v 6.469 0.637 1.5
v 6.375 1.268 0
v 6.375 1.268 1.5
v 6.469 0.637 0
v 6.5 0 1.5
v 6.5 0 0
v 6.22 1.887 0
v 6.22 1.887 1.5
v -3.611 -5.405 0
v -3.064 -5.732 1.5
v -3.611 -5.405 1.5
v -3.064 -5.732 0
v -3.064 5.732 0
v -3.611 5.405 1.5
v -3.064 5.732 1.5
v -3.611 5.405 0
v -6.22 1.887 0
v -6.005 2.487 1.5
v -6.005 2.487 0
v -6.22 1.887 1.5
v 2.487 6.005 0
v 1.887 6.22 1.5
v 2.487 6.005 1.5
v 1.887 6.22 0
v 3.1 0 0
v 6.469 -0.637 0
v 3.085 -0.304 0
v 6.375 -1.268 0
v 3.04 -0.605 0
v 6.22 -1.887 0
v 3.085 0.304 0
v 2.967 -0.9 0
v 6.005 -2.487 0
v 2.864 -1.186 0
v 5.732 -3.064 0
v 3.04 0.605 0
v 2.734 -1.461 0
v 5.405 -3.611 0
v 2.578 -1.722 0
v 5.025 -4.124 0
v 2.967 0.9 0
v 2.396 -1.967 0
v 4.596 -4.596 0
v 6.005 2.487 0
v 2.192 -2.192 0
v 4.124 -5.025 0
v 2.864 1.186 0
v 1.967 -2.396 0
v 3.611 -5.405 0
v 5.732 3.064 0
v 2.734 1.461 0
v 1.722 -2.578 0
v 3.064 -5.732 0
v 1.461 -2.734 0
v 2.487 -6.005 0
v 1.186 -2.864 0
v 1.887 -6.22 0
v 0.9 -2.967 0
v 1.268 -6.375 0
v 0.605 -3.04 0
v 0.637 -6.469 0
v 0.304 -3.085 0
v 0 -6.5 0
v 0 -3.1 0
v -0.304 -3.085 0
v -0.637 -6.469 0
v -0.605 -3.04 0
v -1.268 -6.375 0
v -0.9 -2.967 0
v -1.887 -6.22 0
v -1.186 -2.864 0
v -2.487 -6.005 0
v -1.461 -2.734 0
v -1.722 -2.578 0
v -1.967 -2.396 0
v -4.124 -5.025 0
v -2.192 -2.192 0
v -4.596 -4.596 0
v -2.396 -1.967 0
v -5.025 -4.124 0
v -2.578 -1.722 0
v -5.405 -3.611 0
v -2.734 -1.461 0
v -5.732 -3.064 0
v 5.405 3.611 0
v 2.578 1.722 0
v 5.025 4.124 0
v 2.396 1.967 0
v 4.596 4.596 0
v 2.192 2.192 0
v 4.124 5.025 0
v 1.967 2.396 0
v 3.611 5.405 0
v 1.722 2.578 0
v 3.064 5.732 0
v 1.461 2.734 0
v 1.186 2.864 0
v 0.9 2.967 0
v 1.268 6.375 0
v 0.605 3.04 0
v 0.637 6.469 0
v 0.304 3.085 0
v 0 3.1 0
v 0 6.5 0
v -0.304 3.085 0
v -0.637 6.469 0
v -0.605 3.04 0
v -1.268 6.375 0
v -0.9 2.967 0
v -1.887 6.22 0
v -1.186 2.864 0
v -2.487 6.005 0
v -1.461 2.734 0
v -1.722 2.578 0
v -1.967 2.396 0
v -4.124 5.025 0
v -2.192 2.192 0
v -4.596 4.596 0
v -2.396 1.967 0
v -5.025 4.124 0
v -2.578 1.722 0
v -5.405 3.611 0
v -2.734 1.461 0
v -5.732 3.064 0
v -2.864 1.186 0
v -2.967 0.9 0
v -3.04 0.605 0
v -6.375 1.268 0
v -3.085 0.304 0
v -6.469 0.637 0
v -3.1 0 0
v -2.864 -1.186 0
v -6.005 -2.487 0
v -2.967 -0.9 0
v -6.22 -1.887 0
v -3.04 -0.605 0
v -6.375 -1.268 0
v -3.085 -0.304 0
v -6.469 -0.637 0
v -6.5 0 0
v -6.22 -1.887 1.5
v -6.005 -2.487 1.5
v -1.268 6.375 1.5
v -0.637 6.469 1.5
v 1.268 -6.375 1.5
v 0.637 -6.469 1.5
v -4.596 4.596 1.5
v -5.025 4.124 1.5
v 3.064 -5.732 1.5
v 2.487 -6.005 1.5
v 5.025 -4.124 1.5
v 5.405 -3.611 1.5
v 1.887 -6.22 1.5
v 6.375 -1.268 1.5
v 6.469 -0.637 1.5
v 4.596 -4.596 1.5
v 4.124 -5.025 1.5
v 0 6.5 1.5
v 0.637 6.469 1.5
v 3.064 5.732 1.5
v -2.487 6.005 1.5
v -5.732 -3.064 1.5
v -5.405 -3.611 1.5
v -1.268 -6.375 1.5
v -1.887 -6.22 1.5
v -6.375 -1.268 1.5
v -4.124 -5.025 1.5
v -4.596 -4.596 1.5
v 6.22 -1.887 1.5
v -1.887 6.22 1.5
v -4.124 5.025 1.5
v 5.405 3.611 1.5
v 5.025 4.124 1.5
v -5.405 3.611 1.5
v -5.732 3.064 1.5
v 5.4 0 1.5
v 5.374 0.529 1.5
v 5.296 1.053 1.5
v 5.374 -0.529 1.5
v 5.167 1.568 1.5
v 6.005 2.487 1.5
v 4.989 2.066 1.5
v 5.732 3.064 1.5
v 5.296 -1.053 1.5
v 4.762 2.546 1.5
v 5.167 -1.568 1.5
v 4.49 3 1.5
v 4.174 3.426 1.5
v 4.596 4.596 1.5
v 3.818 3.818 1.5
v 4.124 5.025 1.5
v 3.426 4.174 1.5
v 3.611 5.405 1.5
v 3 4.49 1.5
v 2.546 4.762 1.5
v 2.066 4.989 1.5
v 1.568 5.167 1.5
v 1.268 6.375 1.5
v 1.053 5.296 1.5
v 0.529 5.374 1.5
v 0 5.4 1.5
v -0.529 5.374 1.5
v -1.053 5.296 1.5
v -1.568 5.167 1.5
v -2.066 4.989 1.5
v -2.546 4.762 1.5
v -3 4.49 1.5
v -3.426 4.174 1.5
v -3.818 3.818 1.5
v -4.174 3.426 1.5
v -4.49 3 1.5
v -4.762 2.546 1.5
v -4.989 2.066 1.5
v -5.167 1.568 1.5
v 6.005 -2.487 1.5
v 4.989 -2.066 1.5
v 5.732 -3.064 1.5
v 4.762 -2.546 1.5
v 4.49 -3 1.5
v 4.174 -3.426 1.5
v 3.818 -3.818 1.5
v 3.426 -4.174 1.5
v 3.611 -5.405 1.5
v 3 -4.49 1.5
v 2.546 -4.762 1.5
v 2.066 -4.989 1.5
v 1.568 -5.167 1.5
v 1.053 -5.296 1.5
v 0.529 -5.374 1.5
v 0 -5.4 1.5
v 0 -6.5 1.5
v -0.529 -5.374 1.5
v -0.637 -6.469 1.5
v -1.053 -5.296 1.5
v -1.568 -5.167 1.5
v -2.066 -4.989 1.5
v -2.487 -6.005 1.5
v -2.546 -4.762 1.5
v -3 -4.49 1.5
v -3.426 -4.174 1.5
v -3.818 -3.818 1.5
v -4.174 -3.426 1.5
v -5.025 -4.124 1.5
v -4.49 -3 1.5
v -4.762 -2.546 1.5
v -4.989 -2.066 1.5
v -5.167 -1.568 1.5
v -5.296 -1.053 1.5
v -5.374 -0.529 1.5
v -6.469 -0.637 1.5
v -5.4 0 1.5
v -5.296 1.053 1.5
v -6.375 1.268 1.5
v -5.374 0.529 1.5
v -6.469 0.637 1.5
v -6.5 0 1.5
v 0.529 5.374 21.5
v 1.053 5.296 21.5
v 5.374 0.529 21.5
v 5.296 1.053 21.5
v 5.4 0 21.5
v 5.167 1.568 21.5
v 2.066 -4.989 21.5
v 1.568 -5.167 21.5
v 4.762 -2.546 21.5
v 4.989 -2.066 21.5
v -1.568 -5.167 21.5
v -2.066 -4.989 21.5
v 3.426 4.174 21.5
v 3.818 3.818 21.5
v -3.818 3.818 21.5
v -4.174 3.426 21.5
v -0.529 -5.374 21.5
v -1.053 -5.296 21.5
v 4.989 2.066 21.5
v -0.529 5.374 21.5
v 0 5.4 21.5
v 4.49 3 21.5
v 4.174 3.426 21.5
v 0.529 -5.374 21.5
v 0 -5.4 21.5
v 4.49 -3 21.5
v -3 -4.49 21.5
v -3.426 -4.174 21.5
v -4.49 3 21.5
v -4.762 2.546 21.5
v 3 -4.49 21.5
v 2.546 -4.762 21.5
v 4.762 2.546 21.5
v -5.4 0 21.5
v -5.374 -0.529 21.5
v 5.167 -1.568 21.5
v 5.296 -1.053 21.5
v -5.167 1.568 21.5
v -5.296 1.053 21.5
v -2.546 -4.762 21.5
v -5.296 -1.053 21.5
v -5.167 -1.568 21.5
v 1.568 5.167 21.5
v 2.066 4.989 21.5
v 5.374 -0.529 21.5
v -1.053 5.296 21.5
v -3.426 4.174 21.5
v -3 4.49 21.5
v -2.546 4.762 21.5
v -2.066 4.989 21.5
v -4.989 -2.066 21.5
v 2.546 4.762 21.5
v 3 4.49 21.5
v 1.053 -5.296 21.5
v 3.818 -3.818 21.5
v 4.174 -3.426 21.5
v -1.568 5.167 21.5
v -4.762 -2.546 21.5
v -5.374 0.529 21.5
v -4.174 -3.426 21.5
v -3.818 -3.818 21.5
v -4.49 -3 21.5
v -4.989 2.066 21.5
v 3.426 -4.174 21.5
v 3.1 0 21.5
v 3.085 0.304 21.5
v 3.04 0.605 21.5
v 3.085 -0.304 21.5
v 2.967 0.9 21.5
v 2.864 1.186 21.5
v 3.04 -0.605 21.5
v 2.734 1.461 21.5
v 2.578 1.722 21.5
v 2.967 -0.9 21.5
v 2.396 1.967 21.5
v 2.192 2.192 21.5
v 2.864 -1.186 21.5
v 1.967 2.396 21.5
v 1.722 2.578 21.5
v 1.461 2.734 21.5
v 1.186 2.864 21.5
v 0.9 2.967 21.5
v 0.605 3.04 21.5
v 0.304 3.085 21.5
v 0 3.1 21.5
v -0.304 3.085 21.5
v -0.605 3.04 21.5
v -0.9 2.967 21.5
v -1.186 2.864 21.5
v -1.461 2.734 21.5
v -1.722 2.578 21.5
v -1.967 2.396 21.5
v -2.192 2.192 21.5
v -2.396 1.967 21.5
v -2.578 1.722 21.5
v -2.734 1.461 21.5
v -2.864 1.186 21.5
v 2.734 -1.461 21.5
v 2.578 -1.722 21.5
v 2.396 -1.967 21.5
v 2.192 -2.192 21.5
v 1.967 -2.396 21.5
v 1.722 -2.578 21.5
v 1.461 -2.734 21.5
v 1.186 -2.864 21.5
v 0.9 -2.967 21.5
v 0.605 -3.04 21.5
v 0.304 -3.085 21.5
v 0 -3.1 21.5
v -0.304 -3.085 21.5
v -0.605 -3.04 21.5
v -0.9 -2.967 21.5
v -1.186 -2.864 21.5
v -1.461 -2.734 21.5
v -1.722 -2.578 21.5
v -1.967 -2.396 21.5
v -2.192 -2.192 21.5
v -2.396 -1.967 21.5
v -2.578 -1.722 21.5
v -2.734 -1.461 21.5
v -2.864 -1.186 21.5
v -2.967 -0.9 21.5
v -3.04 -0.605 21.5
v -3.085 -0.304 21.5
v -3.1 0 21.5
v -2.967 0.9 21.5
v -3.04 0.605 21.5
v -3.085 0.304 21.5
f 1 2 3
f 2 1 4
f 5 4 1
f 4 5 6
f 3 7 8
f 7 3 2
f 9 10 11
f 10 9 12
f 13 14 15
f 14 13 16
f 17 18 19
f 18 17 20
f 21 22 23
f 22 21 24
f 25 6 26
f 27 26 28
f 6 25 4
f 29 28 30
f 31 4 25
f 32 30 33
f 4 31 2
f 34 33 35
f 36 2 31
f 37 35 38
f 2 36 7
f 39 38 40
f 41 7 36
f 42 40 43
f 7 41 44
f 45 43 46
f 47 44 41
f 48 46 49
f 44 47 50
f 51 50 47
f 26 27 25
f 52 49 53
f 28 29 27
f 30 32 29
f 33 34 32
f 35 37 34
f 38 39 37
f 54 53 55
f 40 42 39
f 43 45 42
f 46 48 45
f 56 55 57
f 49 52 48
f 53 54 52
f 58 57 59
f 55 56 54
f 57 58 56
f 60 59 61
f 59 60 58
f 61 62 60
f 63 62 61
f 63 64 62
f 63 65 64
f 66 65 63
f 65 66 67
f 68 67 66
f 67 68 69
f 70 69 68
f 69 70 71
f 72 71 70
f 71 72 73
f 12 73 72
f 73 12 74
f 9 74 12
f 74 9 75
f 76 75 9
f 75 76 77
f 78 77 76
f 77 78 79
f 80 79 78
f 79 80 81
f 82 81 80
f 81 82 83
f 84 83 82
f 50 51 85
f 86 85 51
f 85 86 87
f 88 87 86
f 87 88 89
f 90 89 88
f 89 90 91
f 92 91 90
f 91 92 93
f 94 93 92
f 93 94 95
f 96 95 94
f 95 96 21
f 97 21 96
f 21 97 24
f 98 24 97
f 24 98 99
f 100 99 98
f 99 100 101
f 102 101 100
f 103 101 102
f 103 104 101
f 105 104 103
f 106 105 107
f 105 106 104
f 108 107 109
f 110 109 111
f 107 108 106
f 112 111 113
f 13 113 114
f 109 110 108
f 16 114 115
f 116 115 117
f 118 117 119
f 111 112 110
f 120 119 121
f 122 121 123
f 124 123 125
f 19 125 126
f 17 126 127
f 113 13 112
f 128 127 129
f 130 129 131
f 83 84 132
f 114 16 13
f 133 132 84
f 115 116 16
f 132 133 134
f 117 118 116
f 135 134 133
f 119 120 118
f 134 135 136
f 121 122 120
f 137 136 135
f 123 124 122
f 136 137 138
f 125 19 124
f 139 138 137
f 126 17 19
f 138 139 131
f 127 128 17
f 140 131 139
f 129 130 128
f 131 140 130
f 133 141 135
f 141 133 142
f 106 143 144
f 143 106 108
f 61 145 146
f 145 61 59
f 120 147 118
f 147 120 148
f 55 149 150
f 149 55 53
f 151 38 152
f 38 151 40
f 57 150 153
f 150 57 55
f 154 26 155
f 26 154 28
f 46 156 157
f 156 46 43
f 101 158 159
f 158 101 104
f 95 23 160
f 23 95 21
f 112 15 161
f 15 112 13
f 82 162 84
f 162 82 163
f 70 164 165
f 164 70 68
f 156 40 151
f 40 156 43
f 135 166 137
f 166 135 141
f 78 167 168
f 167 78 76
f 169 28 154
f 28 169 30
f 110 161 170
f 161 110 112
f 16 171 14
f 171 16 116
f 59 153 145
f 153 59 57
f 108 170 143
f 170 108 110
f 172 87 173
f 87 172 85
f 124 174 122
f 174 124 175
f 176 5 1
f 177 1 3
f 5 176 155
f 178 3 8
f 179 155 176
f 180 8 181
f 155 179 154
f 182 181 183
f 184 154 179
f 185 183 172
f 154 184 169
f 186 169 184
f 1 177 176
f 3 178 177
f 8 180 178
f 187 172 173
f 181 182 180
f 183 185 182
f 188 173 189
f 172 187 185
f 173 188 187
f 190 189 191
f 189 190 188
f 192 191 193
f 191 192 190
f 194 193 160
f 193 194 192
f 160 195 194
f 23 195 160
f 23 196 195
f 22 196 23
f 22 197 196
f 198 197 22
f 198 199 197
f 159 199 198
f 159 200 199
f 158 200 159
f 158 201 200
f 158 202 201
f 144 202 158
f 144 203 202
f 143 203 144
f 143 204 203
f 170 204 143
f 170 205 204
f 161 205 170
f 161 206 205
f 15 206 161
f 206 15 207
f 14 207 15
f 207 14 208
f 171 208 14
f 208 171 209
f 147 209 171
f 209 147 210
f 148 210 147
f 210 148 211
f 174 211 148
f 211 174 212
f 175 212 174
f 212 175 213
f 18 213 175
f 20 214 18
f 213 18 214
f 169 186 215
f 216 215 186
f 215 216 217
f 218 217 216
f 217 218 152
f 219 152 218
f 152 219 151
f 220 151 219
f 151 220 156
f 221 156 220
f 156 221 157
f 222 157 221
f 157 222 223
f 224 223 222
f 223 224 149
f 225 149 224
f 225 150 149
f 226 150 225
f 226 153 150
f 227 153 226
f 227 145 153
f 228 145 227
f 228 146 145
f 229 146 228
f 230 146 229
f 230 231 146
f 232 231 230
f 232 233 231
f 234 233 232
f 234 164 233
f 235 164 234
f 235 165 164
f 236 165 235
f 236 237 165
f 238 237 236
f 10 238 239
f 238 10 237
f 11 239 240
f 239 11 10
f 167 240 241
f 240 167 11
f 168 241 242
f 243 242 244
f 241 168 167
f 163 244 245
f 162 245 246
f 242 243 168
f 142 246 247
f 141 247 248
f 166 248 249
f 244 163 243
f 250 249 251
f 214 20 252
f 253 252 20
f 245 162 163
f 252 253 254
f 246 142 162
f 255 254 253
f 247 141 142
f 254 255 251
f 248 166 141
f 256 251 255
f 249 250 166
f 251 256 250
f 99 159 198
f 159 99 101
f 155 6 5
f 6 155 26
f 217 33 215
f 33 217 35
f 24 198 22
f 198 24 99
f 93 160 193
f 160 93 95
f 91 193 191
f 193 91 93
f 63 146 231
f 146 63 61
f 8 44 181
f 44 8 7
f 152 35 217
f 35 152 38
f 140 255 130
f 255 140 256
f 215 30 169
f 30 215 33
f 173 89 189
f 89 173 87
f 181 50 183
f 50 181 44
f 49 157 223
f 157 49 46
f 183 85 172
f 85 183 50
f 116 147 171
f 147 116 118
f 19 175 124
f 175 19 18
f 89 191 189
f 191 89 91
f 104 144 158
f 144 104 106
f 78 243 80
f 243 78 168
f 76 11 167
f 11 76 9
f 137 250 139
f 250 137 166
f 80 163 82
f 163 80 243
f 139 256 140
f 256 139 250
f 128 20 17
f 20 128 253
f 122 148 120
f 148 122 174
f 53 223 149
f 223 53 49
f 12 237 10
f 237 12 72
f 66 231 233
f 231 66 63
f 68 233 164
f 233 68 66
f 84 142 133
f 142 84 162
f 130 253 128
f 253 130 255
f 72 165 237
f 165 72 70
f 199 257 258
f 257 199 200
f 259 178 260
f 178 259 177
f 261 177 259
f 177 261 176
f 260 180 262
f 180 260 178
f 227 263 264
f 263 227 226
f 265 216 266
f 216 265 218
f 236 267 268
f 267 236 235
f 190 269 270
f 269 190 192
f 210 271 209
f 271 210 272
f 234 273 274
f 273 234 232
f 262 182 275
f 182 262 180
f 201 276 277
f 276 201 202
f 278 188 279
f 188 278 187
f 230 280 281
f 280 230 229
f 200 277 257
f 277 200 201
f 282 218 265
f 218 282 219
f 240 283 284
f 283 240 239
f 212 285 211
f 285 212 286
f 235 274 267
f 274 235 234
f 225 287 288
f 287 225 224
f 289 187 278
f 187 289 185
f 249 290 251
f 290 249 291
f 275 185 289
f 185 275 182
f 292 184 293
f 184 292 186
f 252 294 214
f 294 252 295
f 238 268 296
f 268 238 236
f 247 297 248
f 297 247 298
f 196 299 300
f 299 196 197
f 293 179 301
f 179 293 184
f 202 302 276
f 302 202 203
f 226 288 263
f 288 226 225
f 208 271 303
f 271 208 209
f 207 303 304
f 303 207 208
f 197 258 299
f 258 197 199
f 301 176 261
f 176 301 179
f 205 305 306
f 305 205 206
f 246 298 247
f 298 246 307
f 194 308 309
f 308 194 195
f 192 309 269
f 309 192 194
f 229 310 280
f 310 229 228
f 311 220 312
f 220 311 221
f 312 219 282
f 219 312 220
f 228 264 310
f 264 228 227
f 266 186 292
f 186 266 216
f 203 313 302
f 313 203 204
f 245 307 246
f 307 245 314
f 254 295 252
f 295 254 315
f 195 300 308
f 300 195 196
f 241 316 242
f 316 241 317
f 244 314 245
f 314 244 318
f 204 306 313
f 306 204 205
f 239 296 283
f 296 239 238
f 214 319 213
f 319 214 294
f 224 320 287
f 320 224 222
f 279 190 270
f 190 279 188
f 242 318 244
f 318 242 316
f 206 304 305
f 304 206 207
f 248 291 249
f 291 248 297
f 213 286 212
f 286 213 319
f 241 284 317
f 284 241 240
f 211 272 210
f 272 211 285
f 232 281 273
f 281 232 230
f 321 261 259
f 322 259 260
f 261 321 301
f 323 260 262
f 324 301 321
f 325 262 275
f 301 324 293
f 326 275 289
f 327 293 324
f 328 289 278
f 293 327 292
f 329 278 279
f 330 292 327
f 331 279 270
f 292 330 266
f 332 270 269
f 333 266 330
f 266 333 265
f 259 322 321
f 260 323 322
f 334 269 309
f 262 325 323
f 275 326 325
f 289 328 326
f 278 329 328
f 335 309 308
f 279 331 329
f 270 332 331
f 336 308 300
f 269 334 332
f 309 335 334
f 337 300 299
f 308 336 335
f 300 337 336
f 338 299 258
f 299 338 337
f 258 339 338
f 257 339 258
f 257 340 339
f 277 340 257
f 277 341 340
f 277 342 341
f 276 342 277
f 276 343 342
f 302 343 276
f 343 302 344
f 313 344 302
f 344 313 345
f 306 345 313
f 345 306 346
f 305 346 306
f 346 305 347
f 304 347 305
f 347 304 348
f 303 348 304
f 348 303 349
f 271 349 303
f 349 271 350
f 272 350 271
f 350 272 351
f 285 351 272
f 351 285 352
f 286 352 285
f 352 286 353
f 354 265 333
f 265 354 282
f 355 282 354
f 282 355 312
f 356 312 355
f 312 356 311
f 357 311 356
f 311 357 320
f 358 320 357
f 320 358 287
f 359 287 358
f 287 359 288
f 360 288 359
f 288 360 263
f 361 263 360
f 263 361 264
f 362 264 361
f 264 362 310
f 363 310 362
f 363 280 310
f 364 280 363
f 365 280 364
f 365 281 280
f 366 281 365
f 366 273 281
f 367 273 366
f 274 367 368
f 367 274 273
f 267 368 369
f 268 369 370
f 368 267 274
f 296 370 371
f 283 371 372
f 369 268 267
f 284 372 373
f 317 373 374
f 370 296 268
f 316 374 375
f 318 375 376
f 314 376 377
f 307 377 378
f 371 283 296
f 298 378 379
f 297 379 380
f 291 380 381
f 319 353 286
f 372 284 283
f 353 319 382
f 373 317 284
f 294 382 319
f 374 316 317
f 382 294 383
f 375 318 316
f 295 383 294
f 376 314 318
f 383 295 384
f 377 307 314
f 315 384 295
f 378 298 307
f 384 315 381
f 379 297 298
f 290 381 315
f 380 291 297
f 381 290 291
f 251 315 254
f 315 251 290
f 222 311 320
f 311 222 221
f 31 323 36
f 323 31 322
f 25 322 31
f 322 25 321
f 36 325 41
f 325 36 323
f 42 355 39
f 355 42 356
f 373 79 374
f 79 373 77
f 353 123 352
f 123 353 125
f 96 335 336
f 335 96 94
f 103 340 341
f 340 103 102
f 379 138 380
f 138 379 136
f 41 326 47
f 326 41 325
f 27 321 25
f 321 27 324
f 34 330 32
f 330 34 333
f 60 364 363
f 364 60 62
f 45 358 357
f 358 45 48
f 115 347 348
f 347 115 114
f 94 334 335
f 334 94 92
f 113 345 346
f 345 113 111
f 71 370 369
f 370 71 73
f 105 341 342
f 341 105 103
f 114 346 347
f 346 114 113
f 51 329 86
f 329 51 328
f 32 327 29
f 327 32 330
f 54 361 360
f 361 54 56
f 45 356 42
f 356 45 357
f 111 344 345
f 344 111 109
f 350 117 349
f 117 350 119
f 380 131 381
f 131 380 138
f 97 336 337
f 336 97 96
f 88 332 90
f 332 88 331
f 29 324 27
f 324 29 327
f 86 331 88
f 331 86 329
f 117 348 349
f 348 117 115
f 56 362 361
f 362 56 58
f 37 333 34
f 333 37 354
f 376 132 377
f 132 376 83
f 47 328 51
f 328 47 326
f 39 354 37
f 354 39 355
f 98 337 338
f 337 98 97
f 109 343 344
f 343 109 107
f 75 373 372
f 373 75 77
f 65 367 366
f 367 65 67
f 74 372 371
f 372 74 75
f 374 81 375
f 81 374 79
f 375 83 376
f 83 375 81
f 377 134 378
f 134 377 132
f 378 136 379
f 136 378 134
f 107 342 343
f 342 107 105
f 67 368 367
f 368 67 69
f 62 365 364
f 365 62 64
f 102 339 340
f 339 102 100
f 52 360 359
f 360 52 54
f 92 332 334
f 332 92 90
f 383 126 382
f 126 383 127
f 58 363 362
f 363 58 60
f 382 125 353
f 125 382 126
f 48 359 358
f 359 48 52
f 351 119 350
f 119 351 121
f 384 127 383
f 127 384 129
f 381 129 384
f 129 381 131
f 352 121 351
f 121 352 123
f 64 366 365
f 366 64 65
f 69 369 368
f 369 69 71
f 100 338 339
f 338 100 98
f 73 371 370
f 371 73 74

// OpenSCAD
// --- Dimensions (mm) ---
collar_diameter = 13.0;      // Diameter of the base collar
collar_thickness = 1.5;      // Height of the base collar
sleeve_outer_diameter = 10.8; // Diameter of the main sleeve body
sleeve_total_height = 21.5;   // Total height from the bed (z=0 to z=21.5)
bore_diameter = 6.2;         // Diameter of the central hole
bore_clearance = 0.1;        // Extra length for cutting to avoid coplanar faces

// --- Constants ---
$fn = 64;

// --- Implementation ---

// The part is printed upside down as requested: 
// The collar lies on the bed (z=0 to 1.5)
// The sleeve rises from the collar to z=21.5

difference() {
    // The solid body
    union() {
        // 1. The Base Collar
        // Rests on the bed at z=0
        cylinder(h = collar_thickness, d = collar_diameter);

        // 2. The Sleeve Body
        // Rises from the top of the collar (z = 1.5) to the total height (z = 21.5)
        // Height of this segment = 21.5 - 1.5 = 20.0
        translate([0, 0, collar_thickness])
            cylinder(h = sleeve_total_height - collar_thickness, d = sleeve_outer_diameter);
    }

    // 3. The Bore (Subtraction)
    // The bore runs through the full height (0 to 21.5)
    // We extend it by bore_clearance on both ends to ensure no thin walls remain at the faces
    translate([0, 0, -bore_clearance])
        cylinder(h = sleeve_total_height + (2 * bore_clearance), d = bore_diameter);
}

// Note on the previous error: 
// The previous code had a logic error where the difference() block was empty 
// and the actual subtraction was placed outside the difference() scope.
// This version correctly wraps the union inside the difference.
